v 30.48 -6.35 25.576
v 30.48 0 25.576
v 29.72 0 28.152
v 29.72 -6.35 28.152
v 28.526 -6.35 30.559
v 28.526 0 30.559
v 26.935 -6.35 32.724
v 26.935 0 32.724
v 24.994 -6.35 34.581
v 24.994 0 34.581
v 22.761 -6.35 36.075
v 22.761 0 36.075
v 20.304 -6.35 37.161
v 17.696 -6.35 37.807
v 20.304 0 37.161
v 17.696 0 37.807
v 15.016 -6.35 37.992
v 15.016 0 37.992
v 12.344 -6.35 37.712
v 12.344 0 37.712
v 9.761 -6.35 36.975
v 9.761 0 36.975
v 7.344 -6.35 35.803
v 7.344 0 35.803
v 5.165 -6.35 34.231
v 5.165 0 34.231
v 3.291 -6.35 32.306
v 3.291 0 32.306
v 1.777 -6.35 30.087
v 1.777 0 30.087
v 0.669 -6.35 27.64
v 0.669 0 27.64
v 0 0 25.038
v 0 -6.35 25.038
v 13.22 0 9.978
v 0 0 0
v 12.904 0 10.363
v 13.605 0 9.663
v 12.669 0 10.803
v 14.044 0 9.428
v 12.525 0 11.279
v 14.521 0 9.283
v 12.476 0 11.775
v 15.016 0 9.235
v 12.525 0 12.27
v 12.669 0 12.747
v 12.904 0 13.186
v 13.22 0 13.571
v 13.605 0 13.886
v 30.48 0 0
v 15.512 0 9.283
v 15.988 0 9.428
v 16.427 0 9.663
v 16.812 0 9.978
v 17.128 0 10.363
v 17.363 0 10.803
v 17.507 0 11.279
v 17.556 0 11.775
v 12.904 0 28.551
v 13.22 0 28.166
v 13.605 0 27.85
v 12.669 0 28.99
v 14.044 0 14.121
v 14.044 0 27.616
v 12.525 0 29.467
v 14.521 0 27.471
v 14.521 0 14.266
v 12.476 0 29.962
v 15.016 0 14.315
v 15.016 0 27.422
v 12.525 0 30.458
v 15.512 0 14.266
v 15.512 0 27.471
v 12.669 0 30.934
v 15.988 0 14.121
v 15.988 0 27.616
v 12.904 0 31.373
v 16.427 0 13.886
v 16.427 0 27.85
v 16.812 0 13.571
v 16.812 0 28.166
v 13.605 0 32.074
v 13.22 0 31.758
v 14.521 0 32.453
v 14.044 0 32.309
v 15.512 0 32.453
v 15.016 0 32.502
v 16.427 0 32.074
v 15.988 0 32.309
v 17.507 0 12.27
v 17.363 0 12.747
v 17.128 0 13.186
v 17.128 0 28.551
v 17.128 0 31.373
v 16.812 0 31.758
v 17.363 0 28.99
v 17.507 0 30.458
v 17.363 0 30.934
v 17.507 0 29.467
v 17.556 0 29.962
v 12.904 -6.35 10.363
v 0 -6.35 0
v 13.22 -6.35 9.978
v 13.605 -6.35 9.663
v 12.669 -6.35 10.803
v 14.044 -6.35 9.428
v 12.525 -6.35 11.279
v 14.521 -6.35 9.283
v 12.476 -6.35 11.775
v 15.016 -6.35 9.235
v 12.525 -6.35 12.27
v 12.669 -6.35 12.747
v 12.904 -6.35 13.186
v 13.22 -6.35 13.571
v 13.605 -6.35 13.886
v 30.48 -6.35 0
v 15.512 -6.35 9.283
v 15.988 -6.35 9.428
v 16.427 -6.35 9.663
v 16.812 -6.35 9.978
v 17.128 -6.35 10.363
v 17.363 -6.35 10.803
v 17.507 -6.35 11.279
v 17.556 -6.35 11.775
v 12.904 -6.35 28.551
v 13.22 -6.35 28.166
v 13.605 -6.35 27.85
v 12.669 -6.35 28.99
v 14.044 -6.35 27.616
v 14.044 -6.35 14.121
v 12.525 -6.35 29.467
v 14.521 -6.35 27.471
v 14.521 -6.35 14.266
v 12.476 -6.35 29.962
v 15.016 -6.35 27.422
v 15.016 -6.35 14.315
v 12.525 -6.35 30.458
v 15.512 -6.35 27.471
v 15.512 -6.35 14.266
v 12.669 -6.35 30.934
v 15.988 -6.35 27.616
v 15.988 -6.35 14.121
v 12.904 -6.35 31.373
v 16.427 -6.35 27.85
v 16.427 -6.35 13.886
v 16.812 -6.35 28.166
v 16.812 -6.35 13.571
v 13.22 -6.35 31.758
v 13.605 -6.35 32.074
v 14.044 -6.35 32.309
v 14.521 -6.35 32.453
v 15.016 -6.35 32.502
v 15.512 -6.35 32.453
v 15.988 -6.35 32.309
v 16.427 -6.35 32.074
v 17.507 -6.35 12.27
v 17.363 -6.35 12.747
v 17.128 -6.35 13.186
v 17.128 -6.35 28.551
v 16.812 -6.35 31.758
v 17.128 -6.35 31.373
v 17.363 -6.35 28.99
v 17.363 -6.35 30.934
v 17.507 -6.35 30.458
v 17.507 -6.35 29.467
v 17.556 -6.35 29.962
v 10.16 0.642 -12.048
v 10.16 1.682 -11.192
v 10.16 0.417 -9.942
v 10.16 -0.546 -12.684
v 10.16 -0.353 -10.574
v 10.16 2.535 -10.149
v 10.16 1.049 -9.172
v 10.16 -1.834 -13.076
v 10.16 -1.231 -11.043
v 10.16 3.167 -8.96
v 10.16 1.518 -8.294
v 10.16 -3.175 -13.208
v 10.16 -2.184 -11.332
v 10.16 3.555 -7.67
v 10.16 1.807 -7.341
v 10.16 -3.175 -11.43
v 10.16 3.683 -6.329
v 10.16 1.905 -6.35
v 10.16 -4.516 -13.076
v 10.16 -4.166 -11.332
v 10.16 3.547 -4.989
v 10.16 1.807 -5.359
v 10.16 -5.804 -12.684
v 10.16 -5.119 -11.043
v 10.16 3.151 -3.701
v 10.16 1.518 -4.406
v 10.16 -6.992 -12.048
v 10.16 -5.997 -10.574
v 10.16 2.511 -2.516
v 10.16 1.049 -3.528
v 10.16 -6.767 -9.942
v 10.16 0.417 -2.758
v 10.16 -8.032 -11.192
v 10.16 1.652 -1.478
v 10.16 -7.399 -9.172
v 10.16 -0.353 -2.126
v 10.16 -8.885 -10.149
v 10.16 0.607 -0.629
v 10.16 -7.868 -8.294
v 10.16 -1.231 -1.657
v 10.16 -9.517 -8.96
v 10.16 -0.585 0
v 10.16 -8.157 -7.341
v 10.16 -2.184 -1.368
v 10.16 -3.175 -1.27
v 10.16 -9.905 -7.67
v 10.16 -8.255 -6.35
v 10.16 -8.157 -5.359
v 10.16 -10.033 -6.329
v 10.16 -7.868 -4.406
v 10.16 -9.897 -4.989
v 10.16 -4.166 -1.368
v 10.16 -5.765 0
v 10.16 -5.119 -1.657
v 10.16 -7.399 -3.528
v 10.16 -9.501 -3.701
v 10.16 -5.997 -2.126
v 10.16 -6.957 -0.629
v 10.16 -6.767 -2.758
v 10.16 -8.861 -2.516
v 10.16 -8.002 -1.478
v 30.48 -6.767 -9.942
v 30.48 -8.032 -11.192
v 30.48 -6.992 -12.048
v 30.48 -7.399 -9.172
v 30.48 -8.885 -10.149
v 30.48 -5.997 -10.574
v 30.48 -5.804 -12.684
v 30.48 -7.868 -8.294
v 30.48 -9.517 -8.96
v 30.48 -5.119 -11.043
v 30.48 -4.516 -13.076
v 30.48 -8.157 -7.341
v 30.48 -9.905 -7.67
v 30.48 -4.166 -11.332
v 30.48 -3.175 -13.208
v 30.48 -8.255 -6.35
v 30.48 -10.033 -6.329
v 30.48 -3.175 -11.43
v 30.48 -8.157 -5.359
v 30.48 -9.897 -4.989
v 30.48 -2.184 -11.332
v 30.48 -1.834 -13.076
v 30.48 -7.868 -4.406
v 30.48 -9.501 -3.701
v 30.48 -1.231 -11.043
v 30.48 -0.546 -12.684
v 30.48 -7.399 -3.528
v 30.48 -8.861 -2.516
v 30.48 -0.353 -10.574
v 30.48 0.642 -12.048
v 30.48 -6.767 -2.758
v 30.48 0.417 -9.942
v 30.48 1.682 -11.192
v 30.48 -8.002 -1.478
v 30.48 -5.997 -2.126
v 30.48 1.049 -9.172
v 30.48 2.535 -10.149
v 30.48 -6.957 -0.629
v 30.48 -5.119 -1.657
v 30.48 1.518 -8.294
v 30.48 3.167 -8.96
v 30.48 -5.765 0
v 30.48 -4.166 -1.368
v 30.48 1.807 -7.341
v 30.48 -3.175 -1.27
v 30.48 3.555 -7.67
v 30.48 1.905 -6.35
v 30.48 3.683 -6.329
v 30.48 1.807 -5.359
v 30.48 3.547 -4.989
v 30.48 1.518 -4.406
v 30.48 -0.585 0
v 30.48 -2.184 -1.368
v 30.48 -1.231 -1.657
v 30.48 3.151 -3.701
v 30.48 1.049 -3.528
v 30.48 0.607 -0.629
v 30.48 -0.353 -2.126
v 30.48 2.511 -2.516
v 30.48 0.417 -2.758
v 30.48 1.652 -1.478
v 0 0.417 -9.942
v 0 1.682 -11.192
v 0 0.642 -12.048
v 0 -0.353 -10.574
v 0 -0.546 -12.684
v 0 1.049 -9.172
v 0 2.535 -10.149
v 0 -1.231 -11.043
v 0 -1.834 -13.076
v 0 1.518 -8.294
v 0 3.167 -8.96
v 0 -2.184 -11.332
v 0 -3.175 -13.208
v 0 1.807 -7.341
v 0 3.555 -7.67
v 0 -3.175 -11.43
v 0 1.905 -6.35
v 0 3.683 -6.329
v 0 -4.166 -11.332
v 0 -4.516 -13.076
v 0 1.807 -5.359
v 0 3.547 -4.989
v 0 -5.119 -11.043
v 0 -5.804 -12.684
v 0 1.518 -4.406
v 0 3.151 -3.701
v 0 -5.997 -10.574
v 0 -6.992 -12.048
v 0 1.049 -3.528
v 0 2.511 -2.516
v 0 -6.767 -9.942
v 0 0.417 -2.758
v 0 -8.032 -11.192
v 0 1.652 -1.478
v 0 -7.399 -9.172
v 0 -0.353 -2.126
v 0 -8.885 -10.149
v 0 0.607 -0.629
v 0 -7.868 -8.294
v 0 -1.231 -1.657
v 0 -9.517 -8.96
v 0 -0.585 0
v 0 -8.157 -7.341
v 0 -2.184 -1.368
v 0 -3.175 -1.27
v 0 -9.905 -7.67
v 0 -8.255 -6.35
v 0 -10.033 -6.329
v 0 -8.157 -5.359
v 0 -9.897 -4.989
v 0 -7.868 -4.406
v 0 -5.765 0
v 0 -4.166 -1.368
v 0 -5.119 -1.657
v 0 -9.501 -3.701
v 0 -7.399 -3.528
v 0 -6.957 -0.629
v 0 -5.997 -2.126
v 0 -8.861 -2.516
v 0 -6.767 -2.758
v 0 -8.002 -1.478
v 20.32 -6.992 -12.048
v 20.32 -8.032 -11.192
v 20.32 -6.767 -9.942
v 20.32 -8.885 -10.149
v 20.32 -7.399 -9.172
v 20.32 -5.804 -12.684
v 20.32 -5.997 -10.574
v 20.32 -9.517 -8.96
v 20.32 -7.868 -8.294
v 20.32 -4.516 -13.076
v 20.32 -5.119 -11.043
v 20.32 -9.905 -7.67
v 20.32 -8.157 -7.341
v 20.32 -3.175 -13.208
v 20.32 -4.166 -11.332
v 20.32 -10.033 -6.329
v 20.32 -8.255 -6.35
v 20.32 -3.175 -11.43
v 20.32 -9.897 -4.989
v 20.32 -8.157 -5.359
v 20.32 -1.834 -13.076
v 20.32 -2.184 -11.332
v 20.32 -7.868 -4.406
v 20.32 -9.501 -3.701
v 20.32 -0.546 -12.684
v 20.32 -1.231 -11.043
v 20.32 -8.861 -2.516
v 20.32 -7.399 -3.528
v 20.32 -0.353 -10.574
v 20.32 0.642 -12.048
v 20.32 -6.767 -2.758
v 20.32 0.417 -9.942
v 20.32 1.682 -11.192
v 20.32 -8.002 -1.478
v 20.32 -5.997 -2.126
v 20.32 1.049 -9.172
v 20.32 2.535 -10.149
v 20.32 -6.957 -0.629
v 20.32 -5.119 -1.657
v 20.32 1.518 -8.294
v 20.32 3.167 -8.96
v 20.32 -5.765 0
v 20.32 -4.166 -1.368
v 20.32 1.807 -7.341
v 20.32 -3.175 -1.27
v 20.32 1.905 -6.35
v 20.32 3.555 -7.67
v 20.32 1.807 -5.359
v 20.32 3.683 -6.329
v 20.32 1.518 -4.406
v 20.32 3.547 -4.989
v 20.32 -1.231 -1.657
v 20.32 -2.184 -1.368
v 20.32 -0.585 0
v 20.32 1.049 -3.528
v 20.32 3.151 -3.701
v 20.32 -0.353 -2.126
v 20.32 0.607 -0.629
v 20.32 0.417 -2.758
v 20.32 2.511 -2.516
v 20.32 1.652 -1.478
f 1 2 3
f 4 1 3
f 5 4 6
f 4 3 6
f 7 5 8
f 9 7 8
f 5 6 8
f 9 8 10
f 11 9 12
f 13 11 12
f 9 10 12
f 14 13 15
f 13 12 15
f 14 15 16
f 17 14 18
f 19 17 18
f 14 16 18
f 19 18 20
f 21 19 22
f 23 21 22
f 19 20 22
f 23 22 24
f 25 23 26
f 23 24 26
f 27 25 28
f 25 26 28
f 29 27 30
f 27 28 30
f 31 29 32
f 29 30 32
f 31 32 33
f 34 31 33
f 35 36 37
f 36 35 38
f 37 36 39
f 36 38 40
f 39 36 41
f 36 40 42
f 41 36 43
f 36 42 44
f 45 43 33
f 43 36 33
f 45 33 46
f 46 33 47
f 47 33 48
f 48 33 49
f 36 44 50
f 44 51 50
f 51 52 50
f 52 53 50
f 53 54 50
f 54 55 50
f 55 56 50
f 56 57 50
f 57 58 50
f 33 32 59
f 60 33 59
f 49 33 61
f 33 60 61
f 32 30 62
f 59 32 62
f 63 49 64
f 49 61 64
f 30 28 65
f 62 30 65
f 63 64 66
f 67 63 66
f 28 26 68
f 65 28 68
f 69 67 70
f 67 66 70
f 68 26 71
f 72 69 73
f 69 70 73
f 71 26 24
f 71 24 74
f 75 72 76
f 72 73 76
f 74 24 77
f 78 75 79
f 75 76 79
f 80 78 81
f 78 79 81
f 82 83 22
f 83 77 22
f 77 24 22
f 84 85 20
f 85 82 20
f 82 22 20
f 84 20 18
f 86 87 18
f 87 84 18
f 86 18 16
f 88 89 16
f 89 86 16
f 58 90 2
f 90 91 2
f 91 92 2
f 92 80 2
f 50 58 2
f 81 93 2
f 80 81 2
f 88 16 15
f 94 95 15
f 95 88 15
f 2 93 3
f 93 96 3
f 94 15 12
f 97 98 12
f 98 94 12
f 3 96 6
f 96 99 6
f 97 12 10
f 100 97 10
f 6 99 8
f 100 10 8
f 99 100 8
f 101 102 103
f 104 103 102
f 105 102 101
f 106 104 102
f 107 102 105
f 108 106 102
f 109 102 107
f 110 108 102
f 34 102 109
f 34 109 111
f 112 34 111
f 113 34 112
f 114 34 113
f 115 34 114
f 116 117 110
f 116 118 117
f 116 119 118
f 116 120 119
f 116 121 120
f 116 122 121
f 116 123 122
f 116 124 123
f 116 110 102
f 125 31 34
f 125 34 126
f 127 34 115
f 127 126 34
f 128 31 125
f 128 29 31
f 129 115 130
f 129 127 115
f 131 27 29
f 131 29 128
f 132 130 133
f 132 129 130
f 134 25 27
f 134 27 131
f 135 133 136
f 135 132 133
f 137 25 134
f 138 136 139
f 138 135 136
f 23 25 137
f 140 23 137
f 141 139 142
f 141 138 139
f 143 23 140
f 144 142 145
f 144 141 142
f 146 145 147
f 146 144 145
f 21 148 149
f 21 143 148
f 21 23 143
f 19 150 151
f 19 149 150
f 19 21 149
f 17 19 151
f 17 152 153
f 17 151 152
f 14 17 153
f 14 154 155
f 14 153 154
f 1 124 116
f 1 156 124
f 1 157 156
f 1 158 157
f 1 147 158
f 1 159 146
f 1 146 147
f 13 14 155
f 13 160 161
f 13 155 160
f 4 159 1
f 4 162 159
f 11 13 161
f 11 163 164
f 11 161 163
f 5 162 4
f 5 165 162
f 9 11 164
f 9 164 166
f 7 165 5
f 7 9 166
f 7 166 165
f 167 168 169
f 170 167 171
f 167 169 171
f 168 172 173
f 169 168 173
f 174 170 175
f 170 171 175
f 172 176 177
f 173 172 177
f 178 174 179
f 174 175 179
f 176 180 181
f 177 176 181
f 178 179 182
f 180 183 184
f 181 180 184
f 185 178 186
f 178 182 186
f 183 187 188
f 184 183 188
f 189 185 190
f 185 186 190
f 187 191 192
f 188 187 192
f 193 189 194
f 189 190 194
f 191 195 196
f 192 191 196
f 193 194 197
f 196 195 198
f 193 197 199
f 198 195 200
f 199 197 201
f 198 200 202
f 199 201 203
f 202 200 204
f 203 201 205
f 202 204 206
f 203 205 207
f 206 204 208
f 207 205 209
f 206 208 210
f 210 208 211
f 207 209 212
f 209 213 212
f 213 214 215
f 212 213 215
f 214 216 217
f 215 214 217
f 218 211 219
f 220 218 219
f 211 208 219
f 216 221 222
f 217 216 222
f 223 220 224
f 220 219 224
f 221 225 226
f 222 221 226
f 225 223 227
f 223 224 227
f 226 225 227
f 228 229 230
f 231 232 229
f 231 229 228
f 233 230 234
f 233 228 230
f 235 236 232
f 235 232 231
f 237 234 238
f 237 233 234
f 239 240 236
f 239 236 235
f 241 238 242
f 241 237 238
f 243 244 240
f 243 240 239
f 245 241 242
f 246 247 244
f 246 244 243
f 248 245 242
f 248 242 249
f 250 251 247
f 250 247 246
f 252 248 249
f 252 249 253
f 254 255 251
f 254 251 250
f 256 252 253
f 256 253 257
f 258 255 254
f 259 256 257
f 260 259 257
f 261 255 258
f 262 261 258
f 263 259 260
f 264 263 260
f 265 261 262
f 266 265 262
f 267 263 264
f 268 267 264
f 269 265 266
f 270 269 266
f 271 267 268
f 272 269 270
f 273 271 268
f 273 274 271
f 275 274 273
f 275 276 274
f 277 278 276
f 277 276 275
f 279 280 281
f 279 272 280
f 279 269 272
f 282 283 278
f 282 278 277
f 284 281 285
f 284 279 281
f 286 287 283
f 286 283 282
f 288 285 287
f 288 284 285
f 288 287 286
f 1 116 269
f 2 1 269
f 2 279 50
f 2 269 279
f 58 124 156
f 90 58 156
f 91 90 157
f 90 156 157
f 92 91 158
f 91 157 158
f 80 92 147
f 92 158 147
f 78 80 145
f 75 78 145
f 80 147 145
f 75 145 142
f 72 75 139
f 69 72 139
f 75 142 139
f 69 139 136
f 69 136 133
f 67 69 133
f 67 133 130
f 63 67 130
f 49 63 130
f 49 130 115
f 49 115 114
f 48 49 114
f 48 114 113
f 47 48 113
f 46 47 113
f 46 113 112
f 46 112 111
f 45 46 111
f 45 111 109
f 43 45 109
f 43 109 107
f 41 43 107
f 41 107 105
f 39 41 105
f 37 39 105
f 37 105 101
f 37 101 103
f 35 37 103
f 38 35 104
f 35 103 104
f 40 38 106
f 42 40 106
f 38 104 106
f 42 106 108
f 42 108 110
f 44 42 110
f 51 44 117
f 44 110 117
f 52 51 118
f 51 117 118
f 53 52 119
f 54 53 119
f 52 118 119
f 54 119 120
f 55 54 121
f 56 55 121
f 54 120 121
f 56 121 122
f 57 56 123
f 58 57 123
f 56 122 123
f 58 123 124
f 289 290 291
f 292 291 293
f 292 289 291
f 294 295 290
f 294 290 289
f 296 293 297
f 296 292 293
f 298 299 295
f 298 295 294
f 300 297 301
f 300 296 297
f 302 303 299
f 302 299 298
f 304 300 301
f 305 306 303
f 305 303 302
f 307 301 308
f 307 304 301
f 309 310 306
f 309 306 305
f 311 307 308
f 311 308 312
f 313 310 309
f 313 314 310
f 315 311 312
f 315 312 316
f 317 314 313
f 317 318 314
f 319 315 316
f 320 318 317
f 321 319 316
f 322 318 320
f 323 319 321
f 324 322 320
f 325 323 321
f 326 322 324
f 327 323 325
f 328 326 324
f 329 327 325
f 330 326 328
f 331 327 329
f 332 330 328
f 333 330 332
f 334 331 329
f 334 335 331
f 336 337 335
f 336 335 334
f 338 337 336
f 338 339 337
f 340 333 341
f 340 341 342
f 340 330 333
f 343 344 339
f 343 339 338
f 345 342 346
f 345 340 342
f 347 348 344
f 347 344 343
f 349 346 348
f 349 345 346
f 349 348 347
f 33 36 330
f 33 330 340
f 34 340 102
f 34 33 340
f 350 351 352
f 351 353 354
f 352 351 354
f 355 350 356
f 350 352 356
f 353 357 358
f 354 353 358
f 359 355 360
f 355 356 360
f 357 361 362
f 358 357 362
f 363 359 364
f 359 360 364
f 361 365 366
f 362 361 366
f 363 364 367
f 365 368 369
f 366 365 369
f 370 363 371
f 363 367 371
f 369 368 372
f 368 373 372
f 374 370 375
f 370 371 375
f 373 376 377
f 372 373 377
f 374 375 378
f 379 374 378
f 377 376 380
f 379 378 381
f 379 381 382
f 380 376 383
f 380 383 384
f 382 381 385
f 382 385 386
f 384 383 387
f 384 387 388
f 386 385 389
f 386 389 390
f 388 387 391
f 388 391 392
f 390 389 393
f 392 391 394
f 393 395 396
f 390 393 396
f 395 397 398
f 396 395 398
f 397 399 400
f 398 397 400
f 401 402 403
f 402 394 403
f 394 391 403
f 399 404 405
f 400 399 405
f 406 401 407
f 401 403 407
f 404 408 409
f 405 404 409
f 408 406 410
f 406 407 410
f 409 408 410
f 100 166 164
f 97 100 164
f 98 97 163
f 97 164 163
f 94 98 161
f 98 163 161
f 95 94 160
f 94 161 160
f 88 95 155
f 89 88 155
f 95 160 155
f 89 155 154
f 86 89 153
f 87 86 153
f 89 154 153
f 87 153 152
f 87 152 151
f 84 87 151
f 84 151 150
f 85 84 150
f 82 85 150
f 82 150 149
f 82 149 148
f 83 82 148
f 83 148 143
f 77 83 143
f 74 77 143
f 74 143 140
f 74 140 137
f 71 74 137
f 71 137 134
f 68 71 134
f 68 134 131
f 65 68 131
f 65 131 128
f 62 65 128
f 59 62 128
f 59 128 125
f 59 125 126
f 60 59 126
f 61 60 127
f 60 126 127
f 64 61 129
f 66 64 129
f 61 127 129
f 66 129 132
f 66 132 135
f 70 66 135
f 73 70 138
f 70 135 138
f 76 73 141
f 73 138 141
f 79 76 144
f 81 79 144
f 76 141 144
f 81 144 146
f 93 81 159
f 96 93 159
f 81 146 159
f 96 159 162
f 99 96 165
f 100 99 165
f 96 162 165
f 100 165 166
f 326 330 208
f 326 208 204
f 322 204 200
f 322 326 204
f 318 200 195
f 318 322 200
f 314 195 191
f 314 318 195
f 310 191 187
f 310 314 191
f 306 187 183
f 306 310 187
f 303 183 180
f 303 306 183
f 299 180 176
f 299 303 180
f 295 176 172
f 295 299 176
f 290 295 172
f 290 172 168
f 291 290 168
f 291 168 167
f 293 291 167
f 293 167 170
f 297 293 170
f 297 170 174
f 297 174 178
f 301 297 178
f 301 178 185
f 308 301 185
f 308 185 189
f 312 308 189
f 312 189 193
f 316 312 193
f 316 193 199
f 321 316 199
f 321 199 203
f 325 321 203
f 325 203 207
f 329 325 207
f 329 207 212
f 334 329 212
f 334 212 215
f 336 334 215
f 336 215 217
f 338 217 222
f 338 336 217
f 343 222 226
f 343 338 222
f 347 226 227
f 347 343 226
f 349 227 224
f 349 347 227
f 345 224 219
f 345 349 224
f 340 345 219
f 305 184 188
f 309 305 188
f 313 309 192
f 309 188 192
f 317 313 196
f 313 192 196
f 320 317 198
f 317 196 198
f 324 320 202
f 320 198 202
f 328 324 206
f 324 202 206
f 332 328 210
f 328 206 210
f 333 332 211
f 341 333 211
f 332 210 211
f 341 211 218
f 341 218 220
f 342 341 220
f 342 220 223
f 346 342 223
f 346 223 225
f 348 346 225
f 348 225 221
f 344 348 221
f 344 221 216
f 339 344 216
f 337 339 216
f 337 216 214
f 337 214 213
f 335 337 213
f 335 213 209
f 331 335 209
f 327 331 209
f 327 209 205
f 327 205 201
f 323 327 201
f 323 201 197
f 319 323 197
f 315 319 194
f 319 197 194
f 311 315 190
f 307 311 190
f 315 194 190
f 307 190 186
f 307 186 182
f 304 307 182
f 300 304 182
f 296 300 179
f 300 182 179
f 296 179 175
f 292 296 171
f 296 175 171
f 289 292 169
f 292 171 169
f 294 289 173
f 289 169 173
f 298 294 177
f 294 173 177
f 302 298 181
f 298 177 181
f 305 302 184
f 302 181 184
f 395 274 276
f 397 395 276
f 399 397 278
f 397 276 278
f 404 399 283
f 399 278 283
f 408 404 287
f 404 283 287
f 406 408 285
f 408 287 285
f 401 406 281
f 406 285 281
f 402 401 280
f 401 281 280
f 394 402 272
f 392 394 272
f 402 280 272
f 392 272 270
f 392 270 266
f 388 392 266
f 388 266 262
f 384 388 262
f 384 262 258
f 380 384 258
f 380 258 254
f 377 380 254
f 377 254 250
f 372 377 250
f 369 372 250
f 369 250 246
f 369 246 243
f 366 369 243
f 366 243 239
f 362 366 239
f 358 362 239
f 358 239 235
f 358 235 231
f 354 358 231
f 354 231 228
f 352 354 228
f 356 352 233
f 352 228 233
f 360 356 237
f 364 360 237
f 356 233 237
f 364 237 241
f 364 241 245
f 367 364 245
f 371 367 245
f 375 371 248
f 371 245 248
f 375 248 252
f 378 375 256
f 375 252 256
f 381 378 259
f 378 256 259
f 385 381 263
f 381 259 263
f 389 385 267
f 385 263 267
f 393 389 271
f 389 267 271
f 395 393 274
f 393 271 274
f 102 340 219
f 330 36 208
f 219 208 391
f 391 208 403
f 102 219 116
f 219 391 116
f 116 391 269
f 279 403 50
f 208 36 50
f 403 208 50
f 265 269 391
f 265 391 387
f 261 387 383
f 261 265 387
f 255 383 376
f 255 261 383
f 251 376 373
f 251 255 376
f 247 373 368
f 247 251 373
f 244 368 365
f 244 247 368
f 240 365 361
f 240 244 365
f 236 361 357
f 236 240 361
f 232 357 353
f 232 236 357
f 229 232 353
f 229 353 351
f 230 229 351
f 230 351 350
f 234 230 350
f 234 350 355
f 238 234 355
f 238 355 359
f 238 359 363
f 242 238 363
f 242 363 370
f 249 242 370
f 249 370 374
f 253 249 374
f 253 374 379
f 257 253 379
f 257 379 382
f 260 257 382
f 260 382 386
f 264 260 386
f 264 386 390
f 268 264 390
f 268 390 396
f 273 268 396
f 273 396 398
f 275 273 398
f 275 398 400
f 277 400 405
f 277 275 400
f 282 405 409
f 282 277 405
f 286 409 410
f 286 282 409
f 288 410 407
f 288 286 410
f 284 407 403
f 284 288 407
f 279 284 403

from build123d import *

# Parameters (mm, degrees)
F1_DEPTH = 6.35
F2_R     = 6.858
F3_DEPTH = 10.16
F4_R     = 6.858
F5_DEPTH = 10.16
F6_R     = 5.08
F7_DEPTH = 30.481
F8_R     = 2.54
F9_DEPTH = 25.4


with BuildPart() as f1:
    # F0 (on Front) → F1 (new body)
    with BuildSketch(Plane.XZ):
        with BuildLine():
            Line((0, 25.037667), (0, 0))
            Line((0, 0), (30.48, 0))
            Line((30.48, 0), (30.48, 25.575707))
            ThreePointArc((30.48, 25.575707), (15.016074, 37.992138), (0, 25.037667))
        make_face()
    extrude(amount=F1_DEPTH)

    # F2 (on face) → F3 (join)
    with BuildSketch(Plane.YZ.offset(30.48)):
        with Locations((-3.175, -6.35)):
            Circle(F2_R)
    extrude(amount=-F3_DEPTH)

    # F4 (on face) → F5 (join)
    with BuildSketch(Plane(origin=(0, 0, 0), x_dir=(0, -1, 0), z_dir=(-1, 0, 0))):
        with Locations((3.175, -6.35)):
            Circle(F4_R)
    extrude(amount=-F5_DEPTH)

    # F6 (on face) → F7 (cut, through all)
    with BuildSketch(Plane.YZ.offset(30.48)):
        with Locations((-3.175, -6.35)):
            Circle(F6_R)
    extrude(amount=-F7_DEPTH, mode=Mode.SUBTRACT)

    # F8 (on face) → F9 (cut)
    with BuildSketch(Plane.XZ.offset(6.35)):
        with Locations((15.016074, 29.962173)):
            Circle(F8_R)
        with Locations((15.016074, 11.774546)):
            Circle(F8_R)
    extrude(amount=-F9_DEPTH, mode=Mode.SUBTRACT)


solid = f1.part
